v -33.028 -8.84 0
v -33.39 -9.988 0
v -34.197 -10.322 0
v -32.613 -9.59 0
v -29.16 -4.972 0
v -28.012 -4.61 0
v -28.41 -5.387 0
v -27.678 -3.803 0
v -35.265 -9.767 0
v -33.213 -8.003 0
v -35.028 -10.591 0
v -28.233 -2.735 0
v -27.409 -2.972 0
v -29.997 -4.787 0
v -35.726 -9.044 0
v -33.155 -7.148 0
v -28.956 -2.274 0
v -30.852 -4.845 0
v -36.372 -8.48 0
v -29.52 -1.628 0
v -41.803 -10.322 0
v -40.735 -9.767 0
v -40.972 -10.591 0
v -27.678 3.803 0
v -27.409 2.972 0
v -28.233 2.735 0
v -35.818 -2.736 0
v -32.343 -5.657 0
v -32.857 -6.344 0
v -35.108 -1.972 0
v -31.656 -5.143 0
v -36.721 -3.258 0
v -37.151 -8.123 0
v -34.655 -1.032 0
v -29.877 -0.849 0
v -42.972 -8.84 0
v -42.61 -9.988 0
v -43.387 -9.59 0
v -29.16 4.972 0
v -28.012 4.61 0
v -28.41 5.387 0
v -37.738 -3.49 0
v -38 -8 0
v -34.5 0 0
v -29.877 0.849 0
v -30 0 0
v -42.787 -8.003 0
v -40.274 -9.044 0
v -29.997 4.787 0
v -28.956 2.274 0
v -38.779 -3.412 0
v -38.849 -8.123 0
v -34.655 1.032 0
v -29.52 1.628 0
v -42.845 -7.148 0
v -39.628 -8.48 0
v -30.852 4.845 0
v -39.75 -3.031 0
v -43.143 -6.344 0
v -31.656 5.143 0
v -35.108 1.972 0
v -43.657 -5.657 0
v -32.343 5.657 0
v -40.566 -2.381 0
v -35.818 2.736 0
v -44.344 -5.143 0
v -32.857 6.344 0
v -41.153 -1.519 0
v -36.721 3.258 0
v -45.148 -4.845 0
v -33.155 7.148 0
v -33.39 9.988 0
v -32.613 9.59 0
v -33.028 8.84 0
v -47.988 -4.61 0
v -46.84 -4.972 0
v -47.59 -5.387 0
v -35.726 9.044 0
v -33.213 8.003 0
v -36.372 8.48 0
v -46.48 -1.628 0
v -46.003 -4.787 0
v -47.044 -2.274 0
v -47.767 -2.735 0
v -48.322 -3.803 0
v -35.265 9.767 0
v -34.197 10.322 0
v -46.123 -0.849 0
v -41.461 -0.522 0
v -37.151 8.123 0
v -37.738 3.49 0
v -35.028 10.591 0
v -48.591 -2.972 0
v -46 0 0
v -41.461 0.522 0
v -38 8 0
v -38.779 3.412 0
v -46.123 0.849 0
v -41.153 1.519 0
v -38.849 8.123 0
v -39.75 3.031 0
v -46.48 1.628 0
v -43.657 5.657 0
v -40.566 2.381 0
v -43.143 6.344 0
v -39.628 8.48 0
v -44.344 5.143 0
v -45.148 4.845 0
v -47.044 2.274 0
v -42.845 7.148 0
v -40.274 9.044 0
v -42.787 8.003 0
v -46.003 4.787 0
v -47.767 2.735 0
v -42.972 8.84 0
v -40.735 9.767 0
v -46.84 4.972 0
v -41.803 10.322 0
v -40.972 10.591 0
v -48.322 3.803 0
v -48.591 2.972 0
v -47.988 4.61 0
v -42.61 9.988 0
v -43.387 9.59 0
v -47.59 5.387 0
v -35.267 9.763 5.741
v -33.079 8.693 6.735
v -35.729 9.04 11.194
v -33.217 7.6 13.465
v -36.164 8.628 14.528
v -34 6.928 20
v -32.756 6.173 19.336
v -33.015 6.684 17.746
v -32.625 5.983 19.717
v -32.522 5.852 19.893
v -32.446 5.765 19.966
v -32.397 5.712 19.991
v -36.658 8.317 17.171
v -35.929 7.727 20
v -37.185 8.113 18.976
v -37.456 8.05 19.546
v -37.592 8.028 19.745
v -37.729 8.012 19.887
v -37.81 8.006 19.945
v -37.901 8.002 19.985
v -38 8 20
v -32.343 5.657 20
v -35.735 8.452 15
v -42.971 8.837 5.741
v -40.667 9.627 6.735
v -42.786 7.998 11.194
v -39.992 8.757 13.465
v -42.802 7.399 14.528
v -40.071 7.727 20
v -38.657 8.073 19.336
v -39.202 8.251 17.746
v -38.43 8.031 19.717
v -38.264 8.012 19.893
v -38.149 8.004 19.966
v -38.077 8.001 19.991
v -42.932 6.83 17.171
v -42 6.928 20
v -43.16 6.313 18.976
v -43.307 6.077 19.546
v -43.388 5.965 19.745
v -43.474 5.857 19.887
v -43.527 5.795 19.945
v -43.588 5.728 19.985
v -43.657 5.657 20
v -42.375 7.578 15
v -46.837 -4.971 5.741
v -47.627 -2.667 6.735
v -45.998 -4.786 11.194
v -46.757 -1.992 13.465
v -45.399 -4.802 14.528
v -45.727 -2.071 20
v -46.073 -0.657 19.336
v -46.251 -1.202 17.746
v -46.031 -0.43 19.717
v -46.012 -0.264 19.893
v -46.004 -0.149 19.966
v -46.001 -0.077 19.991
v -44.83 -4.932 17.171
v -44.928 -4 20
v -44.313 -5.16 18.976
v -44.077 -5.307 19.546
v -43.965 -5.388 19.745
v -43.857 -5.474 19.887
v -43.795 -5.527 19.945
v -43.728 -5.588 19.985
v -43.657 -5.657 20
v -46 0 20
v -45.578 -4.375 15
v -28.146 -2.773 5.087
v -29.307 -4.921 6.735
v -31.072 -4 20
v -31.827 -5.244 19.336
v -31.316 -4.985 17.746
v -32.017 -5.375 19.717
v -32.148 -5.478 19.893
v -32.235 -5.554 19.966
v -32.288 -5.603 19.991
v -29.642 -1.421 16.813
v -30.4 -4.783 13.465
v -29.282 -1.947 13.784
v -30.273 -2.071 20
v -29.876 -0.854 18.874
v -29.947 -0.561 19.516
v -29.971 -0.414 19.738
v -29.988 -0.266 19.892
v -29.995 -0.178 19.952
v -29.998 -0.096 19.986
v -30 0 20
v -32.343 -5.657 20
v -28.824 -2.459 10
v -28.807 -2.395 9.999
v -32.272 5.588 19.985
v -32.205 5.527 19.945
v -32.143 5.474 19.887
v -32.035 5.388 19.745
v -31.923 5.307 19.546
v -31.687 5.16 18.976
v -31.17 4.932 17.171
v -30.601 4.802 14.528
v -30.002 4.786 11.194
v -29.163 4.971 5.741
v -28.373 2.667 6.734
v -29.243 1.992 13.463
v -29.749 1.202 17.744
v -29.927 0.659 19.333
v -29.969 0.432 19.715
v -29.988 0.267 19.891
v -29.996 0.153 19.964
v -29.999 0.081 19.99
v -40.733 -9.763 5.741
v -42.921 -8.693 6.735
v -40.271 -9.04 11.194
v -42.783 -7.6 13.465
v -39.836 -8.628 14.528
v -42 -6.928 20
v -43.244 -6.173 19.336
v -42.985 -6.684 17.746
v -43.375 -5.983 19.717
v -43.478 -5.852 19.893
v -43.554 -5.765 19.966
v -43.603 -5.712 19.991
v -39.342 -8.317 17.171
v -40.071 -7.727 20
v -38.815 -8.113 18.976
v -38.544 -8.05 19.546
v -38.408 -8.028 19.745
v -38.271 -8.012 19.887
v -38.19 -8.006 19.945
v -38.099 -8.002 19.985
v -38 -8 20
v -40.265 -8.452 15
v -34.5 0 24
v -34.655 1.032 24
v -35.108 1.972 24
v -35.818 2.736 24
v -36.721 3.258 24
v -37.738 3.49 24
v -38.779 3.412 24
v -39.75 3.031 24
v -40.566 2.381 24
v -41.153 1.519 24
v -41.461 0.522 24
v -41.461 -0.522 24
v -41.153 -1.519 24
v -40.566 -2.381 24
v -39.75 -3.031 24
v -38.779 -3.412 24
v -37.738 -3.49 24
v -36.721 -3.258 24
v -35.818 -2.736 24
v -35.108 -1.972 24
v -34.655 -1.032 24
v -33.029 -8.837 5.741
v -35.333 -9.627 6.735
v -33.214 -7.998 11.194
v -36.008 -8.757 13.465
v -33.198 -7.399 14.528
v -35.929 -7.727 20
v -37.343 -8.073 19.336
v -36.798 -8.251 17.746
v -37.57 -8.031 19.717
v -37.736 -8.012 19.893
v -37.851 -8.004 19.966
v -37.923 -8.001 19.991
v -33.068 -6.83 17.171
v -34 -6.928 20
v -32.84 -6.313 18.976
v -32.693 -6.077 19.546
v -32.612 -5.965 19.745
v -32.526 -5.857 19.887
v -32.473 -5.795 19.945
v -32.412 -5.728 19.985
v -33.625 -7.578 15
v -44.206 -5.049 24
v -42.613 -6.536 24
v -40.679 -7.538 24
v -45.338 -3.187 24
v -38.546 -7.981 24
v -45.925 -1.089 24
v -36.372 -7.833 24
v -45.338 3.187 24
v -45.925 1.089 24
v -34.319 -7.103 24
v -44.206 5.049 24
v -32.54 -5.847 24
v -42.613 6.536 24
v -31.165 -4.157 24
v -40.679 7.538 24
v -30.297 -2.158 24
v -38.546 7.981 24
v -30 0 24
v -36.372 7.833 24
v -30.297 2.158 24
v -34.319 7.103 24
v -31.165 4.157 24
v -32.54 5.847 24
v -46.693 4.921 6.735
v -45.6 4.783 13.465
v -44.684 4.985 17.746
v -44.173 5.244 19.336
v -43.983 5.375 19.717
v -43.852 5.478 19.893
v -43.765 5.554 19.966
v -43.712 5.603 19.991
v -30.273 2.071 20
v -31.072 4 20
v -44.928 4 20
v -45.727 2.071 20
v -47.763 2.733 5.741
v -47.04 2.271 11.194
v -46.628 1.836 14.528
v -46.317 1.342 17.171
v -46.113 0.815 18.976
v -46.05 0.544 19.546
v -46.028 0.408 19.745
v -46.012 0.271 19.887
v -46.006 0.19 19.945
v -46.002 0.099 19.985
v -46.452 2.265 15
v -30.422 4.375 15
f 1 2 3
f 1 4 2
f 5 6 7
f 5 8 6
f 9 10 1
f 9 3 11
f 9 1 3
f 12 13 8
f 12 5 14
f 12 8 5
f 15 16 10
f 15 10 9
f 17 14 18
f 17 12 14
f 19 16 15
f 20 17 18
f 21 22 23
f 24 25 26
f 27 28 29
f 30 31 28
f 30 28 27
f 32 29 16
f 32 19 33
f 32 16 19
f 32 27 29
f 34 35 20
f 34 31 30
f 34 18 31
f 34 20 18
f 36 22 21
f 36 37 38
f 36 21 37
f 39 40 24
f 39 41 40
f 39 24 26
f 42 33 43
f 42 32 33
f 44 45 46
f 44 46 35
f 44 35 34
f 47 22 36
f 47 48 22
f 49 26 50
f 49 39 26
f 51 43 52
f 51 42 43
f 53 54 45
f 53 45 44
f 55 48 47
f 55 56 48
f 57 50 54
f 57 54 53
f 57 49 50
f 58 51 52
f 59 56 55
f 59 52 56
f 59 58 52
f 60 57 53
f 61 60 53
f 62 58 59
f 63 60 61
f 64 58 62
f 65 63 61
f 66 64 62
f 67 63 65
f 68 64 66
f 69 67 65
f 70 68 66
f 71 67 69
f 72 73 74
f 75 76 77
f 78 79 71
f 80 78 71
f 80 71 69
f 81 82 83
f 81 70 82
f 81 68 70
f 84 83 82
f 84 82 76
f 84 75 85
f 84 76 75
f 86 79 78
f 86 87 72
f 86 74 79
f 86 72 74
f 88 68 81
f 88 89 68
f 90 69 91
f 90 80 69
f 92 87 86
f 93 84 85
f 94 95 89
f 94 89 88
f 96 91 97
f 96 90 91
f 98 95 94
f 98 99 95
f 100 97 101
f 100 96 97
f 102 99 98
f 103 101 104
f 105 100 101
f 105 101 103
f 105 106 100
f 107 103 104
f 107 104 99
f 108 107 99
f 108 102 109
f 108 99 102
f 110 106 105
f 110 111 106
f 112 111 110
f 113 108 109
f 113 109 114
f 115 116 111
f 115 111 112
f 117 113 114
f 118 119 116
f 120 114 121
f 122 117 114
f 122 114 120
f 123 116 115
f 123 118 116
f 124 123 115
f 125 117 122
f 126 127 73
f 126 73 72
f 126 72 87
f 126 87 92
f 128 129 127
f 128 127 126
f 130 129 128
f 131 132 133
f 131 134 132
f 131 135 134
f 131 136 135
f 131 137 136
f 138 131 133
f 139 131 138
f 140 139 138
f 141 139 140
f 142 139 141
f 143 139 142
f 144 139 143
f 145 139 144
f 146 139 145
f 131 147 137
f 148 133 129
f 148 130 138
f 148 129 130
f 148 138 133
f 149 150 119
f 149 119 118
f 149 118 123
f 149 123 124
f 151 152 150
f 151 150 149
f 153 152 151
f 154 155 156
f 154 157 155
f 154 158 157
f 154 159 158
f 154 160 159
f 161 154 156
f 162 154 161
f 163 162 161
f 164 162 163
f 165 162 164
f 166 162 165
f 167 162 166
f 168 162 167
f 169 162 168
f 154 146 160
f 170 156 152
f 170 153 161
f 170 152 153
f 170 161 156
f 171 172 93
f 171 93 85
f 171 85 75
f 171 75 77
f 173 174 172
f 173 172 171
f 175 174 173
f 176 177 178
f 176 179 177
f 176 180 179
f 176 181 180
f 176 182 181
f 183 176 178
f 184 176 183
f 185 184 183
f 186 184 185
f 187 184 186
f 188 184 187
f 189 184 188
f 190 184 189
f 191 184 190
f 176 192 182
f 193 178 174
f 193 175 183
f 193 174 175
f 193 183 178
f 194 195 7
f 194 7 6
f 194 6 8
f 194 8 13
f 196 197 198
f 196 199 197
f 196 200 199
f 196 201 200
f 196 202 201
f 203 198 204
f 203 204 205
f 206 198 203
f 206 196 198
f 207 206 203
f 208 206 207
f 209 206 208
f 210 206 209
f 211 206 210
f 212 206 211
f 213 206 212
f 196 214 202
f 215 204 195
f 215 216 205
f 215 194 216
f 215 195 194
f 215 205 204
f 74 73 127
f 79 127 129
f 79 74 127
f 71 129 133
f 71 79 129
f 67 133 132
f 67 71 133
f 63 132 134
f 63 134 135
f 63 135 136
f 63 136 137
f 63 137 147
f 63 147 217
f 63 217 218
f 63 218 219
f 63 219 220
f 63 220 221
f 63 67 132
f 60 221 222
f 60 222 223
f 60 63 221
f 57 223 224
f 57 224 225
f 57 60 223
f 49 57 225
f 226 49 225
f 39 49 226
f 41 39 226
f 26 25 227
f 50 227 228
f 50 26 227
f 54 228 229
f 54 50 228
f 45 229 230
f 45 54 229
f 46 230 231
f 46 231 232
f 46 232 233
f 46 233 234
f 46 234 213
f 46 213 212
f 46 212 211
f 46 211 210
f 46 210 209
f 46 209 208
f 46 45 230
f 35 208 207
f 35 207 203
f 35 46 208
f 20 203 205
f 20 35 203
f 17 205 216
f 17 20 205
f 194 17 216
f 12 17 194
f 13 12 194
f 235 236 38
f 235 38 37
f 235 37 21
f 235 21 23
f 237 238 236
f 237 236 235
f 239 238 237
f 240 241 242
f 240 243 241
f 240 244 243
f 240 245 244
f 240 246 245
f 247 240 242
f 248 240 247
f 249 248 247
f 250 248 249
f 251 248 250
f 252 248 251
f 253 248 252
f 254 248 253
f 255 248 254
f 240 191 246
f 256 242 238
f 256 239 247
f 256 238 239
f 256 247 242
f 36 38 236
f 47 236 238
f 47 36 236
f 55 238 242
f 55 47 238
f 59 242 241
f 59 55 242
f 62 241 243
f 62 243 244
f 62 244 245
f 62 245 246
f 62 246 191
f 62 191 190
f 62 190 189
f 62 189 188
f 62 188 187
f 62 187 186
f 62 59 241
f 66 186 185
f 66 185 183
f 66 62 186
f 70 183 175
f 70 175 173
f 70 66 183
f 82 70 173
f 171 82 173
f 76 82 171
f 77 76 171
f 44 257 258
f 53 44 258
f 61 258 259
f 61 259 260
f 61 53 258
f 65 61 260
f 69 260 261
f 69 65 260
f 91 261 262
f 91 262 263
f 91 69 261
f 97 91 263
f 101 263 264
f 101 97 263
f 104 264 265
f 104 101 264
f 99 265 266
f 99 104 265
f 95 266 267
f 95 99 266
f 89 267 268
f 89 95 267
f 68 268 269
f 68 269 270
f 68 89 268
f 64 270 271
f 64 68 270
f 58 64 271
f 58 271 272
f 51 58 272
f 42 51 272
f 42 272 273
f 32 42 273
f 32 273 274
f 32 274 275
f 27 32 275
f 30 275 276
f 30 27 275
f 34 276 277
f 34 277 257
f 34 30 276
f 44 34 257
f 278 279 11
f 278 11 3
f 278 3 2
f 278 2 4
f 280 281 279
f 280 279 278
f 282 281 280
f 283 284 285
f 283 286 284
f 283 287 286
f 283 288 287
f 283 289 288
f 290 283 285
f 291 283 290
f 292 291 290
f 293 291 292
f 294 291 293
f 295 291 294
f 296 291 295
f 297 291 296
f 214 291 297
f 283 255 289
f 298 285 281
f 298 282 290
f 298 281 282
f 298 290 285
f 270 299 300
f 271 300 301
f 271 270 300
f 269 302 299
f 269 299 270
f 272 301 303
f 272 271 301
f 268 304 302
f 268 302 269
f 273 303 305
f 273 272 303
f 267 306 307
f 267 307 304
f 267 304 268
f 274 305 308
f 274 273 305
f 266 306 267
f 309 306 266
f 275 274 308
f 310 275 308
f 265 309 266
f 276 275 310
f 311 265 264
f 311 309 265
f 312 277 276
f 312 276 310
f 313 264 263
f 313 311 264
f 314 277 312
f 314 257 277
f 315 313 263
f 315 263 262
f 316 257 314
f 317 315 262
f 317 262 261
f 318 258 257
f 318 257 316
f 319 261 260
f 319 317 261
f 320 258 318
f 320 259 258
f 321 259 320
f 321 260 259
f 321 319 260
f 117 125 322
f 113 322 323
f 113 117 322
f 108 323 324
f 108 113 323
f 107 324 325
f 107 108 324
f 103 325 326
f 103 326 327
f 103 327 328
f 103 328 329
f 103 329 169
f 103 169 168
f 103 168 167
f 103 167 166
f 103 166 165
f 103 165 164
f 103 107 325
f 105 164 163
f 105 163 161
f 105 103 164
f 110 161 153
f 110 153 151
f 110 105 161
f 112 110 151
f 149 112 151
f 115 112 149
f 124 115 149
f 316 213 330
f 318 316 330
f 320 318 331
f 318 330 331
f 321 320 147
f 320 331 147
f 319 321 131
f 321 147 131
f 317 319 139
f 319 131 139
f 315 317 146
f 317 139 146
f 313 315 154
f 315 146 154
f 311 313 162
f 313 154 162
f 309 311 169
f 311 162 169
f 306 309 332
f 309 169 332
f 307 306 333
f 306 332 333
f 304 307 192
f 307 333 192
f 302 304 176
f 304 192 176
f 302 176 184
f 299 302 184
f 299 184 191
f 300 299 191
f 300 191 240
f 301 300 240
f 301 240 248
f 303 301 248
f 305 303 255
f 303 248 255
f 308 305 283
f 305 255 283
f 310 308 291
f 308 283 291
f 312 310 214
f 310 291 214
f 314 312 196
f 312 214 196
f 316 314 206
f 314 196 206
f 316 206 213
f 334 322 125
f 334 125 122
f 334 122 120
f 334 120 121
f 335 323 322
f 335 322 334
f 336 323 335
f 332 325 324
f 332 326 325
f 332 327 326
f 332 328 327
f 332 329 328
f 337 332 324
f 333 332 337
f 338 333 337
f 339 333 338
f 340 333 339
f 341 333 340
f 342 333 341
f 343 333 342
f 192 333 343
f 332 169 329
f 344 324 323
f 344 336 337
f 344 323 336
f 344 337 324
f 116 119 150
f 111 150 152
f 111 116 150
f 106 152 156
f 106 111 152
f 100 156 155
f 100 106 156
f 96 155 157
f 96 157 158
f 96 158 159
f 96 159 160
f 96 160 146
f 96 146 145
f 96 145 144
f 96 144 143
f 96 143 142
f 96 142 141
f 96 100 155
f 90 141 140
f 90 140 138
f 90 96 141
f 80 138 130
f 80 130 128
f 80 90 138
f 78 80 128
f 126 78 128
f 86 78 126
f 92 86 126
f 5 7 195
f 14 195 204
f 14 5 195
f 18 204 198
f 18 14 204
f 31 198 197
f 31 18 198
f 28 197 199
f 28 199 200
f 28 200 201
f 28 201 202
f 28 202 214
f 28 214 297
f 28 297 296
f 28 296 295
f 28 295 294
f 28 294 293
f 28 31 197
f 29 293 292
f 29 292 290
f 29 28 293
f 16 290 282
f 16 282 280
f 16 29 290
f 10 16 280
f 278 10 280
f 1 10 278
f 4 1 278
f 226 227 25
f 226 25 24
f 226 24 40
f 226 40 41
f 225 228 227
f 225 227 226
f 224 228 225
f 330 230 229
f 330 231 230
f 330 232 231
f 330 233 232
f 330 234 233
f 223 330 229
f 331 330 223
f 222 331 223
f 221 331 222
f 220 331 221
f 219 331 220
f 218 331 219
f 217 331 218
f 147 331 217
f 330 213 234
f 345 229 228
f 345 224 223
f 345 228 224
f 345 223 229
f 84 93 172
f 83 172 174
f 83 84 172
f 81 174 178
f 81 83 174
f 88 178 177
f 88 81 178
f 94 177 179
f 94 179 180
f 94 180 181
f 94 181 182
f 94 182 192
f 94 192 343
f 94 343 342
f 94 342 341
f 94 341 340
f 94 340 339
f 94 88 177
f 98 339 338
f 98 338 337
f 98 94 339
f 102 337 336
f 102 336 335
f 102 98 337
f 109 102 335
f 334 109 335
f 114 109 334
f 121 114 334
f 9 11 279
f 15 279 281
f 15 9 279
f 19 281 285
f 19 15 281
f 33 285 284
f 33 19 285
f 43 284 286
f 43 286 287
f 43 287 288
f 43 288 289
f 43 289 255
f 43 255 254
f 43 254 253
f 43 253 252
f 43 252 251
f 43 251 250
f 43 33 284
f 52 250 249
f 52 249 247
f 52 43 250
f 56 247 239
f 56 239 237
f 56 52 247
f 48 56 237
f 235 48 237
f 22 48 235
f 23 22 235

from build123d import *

# Parameters (mm, degrees)
CYLINDER030_R         = 8
CYLINDER030_DEPTH     = 4
CYLINDER056_R         = 3
CYLINDER056_DEPTH     = 20
POLARPATTERN011_COUNT = 8
CYLINDER057_R         = 3.5
CYLINDER057_DEPTH     = 24


with BuildPart() as part:
    # Cone → Cone (revolve)
    with BuildSketch(Plane.XZ):
        Polygon((0, 0), (11, 0), (8, 20), (0, 20), align=None)
    revolve(axis=Axis((0, 0, 0), (0, 0, 1)))

    # Cylinder030 → Cylinder030 (join)
    with BuildSketch(Plane.XY.offset(20)):
        Circle(CYLINDER030_R)
    extrude(amount=CYLINDER030_DEPTH)

    # Cylinder056 → Cylinder056 (cut)
    with BuildSketch(Plane(origin=(11, 0, 0), x_dir=(1, 0, 0), z_dir=(0, 0, 1))):
        Circle(CYLINDER056_R)
    cylinder056 = extrude(amount=CYLINDER056_DEPTH, mode=Mode.SUBTRACT)

    # PolarPattern011: Cylinder056 ×8 about axis
    polarpattern011_axis = Axis((0, 0, 0), (0, 0, 1))
    for i in range(1, POLARPATTERN011_COUNT):
        add(cylinder056.rotate(polarpattern011_axis, i * 360 / POLARPATTERN011_COUNT), mode=Mode.SUBTRACT)

    # Cylinder057 → Cylinder057 (cut)
    with BuildSketch(Plane.XY):
        Circle(CYLINDER057_R)
    extrude(amount=CYLINDER057_DEPTH, mode=Mode.SUBTRACT)


with BuildPart() as part_1:
    # Body017 placement: moved
    add(part.part.moved(Location((-38, 0, 0))))


solid = part_1.part
